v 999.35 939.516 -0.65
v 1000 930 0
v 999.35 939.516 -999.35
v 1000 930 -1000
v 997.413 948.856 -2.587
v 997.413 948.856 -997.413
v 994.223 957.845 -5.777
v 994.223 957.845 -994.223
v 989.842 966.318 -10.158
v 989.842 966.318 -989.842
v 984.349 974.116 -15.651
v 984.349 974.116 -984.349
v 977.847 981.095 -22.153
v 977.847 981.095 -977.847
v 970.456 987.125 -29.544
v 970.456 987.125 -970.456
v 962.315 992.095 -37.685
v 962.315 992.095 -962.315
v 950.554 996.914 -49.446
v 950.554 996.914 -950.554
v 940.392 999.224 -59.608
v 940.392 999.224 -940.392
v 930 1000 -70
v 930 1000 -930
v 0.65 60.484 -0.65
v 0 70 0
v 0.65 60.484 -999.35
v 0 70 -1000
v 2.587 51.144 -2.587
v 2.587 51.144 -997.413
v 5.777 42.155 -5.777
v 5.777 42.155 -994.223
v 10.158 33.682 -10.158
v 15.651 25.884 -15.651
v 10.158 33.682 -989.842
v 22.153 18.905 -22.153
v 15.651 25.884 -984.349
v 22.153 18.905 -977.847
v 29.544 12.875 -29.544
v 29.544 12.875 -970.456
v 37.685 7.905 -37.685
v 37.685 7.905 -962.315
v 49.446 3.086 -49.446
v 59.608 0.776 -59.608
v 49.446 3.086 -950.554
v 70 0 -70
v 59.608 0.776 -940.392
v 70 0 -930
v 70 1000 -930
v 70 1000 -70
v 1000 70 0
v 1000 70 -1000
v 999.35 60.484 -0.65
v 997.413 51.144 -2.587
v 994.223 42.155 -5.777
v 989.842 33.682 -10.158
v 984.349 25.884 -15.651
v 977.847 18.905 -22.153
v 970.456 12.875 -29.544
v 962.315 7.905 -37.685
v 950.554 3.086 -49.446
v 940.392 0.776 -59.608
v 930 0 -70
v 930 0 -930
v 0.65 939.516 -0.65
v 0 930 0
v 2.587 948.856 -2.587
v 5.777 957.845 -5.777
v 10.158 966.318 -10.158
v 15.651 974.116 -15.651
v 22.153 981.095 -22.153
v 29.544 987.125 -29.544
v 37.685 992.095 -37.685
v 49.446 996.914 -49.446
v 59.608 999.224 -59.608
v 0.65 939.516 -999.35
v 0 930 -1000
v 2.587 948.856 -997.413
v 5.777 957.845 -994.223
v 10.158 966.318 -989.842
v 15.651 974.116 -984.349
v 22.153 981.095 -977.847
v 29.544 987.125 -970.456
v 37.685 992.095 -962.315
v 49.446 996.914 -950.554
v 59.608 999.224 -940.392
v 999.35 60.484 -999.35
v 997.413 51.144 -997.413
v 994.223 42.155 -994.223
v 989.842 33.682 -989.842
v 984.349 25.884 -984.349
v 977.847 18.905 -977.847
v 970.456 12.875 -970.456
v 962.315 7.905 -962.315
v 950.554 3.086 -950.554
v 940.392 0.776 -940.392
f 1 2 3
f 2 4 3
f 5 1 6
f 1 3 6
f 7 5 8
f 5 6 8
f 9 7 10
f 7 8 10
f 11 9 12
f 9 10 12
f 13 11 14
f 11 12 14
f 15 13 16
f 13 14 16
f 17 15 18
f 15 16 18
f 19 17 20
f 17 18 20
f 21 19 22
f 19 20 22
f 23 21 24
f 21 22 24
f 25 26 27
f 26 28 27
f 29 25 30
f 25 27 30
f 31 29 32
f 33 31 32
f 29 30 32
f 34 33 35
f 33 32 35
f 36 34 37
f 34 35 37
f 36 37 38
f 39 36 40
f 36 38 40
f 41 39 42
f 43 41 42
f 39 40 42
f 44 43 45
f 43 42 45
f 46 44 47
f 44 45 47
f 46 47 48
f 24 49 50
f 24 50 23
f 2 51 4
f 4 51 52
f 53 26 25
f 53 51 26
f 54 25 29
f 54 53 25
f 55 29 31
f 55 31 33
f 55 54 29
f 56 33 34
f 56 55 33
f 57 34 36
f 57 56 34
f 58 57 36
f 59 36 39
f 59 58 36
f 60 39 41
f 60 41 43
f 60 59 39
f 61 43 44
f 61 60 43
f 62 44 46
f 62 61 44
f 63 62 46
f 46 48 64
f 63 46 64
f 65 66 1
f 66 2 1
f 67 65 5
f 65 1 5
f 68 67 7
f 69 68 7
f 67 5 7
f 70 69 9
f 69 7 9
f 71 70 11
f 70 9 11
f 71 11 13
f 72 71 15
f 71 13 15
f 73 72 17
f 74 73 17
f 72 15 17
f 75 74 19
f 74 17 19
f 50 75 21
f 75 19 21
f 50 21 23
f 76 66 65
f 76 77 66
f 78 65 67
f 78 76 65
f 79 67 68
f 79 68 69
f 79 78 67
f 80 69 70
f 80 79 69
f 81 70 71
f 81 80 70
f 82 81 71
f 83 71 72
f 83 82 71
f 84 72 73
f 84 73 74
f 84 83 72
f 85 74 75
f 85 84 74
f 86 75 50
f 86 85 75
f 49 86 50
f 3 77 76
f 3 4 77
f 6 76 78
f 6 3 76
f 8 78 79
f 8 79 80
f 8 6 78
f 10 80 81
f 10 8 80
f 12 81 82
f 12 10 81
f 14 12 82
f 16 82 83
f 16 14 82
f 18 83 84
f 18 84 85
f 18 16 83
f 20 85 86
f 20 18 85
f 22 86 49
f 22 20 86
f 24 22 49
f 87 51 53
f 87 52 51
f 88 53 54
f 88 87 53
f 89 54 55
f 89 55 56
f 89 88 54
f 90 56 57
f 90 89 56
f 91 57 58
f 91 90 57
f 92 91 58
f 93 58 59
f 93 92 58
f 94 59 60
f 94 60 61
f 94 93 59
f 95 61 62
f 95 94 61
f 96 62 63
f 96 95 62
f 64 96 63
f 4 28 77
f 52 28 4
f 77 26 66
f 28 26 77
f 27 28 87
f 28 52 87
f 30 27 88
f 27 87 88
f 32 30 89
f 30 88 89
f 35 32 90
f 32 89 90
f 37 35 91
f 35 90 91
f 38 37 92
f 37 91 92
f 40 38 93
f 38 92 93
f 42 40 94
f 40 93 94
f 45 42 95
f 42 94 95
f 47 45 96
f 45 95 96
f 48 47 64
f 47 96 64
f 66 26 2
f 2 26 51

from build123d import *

# Parameters (mm, degrees)
SKETCH1_W           = 1000
SKETCH1_H           = 1000
BOSS_EXTRUDE2_DEPTH = 1000
FILLET2_R           = 70


with BuildPart() as part:
    # Sketch1 → Boss-Extrude2 (new body)
    with BuildSketch(Plane(origin=(0, 0, 0), x_dir=(1, 0, 0), z_dir=(0, 1, 0))):
        with Locations((500, 500)):
            Rectangle(SKETCH1_W, SKETCH1_H)
    extrude(amount=BOSS_EXTRUDE2_DEPTH)

    # Fillet2
    fillet2_edges = [part.edges().sort_by_distance(p)[0] for p in [
        (1000, 1000, -500),
        (500, 1000, -1000),
        (0, 1000, -500),
        (500, 0, -1000),
        (1000, 0, -500),
        (500, 0, 0),
        (0, 0, -500),
        (500, 1000, 0),
    ]]
    fillet(fillet2_edges, radius=FILLET2_R)


solid = part.part
